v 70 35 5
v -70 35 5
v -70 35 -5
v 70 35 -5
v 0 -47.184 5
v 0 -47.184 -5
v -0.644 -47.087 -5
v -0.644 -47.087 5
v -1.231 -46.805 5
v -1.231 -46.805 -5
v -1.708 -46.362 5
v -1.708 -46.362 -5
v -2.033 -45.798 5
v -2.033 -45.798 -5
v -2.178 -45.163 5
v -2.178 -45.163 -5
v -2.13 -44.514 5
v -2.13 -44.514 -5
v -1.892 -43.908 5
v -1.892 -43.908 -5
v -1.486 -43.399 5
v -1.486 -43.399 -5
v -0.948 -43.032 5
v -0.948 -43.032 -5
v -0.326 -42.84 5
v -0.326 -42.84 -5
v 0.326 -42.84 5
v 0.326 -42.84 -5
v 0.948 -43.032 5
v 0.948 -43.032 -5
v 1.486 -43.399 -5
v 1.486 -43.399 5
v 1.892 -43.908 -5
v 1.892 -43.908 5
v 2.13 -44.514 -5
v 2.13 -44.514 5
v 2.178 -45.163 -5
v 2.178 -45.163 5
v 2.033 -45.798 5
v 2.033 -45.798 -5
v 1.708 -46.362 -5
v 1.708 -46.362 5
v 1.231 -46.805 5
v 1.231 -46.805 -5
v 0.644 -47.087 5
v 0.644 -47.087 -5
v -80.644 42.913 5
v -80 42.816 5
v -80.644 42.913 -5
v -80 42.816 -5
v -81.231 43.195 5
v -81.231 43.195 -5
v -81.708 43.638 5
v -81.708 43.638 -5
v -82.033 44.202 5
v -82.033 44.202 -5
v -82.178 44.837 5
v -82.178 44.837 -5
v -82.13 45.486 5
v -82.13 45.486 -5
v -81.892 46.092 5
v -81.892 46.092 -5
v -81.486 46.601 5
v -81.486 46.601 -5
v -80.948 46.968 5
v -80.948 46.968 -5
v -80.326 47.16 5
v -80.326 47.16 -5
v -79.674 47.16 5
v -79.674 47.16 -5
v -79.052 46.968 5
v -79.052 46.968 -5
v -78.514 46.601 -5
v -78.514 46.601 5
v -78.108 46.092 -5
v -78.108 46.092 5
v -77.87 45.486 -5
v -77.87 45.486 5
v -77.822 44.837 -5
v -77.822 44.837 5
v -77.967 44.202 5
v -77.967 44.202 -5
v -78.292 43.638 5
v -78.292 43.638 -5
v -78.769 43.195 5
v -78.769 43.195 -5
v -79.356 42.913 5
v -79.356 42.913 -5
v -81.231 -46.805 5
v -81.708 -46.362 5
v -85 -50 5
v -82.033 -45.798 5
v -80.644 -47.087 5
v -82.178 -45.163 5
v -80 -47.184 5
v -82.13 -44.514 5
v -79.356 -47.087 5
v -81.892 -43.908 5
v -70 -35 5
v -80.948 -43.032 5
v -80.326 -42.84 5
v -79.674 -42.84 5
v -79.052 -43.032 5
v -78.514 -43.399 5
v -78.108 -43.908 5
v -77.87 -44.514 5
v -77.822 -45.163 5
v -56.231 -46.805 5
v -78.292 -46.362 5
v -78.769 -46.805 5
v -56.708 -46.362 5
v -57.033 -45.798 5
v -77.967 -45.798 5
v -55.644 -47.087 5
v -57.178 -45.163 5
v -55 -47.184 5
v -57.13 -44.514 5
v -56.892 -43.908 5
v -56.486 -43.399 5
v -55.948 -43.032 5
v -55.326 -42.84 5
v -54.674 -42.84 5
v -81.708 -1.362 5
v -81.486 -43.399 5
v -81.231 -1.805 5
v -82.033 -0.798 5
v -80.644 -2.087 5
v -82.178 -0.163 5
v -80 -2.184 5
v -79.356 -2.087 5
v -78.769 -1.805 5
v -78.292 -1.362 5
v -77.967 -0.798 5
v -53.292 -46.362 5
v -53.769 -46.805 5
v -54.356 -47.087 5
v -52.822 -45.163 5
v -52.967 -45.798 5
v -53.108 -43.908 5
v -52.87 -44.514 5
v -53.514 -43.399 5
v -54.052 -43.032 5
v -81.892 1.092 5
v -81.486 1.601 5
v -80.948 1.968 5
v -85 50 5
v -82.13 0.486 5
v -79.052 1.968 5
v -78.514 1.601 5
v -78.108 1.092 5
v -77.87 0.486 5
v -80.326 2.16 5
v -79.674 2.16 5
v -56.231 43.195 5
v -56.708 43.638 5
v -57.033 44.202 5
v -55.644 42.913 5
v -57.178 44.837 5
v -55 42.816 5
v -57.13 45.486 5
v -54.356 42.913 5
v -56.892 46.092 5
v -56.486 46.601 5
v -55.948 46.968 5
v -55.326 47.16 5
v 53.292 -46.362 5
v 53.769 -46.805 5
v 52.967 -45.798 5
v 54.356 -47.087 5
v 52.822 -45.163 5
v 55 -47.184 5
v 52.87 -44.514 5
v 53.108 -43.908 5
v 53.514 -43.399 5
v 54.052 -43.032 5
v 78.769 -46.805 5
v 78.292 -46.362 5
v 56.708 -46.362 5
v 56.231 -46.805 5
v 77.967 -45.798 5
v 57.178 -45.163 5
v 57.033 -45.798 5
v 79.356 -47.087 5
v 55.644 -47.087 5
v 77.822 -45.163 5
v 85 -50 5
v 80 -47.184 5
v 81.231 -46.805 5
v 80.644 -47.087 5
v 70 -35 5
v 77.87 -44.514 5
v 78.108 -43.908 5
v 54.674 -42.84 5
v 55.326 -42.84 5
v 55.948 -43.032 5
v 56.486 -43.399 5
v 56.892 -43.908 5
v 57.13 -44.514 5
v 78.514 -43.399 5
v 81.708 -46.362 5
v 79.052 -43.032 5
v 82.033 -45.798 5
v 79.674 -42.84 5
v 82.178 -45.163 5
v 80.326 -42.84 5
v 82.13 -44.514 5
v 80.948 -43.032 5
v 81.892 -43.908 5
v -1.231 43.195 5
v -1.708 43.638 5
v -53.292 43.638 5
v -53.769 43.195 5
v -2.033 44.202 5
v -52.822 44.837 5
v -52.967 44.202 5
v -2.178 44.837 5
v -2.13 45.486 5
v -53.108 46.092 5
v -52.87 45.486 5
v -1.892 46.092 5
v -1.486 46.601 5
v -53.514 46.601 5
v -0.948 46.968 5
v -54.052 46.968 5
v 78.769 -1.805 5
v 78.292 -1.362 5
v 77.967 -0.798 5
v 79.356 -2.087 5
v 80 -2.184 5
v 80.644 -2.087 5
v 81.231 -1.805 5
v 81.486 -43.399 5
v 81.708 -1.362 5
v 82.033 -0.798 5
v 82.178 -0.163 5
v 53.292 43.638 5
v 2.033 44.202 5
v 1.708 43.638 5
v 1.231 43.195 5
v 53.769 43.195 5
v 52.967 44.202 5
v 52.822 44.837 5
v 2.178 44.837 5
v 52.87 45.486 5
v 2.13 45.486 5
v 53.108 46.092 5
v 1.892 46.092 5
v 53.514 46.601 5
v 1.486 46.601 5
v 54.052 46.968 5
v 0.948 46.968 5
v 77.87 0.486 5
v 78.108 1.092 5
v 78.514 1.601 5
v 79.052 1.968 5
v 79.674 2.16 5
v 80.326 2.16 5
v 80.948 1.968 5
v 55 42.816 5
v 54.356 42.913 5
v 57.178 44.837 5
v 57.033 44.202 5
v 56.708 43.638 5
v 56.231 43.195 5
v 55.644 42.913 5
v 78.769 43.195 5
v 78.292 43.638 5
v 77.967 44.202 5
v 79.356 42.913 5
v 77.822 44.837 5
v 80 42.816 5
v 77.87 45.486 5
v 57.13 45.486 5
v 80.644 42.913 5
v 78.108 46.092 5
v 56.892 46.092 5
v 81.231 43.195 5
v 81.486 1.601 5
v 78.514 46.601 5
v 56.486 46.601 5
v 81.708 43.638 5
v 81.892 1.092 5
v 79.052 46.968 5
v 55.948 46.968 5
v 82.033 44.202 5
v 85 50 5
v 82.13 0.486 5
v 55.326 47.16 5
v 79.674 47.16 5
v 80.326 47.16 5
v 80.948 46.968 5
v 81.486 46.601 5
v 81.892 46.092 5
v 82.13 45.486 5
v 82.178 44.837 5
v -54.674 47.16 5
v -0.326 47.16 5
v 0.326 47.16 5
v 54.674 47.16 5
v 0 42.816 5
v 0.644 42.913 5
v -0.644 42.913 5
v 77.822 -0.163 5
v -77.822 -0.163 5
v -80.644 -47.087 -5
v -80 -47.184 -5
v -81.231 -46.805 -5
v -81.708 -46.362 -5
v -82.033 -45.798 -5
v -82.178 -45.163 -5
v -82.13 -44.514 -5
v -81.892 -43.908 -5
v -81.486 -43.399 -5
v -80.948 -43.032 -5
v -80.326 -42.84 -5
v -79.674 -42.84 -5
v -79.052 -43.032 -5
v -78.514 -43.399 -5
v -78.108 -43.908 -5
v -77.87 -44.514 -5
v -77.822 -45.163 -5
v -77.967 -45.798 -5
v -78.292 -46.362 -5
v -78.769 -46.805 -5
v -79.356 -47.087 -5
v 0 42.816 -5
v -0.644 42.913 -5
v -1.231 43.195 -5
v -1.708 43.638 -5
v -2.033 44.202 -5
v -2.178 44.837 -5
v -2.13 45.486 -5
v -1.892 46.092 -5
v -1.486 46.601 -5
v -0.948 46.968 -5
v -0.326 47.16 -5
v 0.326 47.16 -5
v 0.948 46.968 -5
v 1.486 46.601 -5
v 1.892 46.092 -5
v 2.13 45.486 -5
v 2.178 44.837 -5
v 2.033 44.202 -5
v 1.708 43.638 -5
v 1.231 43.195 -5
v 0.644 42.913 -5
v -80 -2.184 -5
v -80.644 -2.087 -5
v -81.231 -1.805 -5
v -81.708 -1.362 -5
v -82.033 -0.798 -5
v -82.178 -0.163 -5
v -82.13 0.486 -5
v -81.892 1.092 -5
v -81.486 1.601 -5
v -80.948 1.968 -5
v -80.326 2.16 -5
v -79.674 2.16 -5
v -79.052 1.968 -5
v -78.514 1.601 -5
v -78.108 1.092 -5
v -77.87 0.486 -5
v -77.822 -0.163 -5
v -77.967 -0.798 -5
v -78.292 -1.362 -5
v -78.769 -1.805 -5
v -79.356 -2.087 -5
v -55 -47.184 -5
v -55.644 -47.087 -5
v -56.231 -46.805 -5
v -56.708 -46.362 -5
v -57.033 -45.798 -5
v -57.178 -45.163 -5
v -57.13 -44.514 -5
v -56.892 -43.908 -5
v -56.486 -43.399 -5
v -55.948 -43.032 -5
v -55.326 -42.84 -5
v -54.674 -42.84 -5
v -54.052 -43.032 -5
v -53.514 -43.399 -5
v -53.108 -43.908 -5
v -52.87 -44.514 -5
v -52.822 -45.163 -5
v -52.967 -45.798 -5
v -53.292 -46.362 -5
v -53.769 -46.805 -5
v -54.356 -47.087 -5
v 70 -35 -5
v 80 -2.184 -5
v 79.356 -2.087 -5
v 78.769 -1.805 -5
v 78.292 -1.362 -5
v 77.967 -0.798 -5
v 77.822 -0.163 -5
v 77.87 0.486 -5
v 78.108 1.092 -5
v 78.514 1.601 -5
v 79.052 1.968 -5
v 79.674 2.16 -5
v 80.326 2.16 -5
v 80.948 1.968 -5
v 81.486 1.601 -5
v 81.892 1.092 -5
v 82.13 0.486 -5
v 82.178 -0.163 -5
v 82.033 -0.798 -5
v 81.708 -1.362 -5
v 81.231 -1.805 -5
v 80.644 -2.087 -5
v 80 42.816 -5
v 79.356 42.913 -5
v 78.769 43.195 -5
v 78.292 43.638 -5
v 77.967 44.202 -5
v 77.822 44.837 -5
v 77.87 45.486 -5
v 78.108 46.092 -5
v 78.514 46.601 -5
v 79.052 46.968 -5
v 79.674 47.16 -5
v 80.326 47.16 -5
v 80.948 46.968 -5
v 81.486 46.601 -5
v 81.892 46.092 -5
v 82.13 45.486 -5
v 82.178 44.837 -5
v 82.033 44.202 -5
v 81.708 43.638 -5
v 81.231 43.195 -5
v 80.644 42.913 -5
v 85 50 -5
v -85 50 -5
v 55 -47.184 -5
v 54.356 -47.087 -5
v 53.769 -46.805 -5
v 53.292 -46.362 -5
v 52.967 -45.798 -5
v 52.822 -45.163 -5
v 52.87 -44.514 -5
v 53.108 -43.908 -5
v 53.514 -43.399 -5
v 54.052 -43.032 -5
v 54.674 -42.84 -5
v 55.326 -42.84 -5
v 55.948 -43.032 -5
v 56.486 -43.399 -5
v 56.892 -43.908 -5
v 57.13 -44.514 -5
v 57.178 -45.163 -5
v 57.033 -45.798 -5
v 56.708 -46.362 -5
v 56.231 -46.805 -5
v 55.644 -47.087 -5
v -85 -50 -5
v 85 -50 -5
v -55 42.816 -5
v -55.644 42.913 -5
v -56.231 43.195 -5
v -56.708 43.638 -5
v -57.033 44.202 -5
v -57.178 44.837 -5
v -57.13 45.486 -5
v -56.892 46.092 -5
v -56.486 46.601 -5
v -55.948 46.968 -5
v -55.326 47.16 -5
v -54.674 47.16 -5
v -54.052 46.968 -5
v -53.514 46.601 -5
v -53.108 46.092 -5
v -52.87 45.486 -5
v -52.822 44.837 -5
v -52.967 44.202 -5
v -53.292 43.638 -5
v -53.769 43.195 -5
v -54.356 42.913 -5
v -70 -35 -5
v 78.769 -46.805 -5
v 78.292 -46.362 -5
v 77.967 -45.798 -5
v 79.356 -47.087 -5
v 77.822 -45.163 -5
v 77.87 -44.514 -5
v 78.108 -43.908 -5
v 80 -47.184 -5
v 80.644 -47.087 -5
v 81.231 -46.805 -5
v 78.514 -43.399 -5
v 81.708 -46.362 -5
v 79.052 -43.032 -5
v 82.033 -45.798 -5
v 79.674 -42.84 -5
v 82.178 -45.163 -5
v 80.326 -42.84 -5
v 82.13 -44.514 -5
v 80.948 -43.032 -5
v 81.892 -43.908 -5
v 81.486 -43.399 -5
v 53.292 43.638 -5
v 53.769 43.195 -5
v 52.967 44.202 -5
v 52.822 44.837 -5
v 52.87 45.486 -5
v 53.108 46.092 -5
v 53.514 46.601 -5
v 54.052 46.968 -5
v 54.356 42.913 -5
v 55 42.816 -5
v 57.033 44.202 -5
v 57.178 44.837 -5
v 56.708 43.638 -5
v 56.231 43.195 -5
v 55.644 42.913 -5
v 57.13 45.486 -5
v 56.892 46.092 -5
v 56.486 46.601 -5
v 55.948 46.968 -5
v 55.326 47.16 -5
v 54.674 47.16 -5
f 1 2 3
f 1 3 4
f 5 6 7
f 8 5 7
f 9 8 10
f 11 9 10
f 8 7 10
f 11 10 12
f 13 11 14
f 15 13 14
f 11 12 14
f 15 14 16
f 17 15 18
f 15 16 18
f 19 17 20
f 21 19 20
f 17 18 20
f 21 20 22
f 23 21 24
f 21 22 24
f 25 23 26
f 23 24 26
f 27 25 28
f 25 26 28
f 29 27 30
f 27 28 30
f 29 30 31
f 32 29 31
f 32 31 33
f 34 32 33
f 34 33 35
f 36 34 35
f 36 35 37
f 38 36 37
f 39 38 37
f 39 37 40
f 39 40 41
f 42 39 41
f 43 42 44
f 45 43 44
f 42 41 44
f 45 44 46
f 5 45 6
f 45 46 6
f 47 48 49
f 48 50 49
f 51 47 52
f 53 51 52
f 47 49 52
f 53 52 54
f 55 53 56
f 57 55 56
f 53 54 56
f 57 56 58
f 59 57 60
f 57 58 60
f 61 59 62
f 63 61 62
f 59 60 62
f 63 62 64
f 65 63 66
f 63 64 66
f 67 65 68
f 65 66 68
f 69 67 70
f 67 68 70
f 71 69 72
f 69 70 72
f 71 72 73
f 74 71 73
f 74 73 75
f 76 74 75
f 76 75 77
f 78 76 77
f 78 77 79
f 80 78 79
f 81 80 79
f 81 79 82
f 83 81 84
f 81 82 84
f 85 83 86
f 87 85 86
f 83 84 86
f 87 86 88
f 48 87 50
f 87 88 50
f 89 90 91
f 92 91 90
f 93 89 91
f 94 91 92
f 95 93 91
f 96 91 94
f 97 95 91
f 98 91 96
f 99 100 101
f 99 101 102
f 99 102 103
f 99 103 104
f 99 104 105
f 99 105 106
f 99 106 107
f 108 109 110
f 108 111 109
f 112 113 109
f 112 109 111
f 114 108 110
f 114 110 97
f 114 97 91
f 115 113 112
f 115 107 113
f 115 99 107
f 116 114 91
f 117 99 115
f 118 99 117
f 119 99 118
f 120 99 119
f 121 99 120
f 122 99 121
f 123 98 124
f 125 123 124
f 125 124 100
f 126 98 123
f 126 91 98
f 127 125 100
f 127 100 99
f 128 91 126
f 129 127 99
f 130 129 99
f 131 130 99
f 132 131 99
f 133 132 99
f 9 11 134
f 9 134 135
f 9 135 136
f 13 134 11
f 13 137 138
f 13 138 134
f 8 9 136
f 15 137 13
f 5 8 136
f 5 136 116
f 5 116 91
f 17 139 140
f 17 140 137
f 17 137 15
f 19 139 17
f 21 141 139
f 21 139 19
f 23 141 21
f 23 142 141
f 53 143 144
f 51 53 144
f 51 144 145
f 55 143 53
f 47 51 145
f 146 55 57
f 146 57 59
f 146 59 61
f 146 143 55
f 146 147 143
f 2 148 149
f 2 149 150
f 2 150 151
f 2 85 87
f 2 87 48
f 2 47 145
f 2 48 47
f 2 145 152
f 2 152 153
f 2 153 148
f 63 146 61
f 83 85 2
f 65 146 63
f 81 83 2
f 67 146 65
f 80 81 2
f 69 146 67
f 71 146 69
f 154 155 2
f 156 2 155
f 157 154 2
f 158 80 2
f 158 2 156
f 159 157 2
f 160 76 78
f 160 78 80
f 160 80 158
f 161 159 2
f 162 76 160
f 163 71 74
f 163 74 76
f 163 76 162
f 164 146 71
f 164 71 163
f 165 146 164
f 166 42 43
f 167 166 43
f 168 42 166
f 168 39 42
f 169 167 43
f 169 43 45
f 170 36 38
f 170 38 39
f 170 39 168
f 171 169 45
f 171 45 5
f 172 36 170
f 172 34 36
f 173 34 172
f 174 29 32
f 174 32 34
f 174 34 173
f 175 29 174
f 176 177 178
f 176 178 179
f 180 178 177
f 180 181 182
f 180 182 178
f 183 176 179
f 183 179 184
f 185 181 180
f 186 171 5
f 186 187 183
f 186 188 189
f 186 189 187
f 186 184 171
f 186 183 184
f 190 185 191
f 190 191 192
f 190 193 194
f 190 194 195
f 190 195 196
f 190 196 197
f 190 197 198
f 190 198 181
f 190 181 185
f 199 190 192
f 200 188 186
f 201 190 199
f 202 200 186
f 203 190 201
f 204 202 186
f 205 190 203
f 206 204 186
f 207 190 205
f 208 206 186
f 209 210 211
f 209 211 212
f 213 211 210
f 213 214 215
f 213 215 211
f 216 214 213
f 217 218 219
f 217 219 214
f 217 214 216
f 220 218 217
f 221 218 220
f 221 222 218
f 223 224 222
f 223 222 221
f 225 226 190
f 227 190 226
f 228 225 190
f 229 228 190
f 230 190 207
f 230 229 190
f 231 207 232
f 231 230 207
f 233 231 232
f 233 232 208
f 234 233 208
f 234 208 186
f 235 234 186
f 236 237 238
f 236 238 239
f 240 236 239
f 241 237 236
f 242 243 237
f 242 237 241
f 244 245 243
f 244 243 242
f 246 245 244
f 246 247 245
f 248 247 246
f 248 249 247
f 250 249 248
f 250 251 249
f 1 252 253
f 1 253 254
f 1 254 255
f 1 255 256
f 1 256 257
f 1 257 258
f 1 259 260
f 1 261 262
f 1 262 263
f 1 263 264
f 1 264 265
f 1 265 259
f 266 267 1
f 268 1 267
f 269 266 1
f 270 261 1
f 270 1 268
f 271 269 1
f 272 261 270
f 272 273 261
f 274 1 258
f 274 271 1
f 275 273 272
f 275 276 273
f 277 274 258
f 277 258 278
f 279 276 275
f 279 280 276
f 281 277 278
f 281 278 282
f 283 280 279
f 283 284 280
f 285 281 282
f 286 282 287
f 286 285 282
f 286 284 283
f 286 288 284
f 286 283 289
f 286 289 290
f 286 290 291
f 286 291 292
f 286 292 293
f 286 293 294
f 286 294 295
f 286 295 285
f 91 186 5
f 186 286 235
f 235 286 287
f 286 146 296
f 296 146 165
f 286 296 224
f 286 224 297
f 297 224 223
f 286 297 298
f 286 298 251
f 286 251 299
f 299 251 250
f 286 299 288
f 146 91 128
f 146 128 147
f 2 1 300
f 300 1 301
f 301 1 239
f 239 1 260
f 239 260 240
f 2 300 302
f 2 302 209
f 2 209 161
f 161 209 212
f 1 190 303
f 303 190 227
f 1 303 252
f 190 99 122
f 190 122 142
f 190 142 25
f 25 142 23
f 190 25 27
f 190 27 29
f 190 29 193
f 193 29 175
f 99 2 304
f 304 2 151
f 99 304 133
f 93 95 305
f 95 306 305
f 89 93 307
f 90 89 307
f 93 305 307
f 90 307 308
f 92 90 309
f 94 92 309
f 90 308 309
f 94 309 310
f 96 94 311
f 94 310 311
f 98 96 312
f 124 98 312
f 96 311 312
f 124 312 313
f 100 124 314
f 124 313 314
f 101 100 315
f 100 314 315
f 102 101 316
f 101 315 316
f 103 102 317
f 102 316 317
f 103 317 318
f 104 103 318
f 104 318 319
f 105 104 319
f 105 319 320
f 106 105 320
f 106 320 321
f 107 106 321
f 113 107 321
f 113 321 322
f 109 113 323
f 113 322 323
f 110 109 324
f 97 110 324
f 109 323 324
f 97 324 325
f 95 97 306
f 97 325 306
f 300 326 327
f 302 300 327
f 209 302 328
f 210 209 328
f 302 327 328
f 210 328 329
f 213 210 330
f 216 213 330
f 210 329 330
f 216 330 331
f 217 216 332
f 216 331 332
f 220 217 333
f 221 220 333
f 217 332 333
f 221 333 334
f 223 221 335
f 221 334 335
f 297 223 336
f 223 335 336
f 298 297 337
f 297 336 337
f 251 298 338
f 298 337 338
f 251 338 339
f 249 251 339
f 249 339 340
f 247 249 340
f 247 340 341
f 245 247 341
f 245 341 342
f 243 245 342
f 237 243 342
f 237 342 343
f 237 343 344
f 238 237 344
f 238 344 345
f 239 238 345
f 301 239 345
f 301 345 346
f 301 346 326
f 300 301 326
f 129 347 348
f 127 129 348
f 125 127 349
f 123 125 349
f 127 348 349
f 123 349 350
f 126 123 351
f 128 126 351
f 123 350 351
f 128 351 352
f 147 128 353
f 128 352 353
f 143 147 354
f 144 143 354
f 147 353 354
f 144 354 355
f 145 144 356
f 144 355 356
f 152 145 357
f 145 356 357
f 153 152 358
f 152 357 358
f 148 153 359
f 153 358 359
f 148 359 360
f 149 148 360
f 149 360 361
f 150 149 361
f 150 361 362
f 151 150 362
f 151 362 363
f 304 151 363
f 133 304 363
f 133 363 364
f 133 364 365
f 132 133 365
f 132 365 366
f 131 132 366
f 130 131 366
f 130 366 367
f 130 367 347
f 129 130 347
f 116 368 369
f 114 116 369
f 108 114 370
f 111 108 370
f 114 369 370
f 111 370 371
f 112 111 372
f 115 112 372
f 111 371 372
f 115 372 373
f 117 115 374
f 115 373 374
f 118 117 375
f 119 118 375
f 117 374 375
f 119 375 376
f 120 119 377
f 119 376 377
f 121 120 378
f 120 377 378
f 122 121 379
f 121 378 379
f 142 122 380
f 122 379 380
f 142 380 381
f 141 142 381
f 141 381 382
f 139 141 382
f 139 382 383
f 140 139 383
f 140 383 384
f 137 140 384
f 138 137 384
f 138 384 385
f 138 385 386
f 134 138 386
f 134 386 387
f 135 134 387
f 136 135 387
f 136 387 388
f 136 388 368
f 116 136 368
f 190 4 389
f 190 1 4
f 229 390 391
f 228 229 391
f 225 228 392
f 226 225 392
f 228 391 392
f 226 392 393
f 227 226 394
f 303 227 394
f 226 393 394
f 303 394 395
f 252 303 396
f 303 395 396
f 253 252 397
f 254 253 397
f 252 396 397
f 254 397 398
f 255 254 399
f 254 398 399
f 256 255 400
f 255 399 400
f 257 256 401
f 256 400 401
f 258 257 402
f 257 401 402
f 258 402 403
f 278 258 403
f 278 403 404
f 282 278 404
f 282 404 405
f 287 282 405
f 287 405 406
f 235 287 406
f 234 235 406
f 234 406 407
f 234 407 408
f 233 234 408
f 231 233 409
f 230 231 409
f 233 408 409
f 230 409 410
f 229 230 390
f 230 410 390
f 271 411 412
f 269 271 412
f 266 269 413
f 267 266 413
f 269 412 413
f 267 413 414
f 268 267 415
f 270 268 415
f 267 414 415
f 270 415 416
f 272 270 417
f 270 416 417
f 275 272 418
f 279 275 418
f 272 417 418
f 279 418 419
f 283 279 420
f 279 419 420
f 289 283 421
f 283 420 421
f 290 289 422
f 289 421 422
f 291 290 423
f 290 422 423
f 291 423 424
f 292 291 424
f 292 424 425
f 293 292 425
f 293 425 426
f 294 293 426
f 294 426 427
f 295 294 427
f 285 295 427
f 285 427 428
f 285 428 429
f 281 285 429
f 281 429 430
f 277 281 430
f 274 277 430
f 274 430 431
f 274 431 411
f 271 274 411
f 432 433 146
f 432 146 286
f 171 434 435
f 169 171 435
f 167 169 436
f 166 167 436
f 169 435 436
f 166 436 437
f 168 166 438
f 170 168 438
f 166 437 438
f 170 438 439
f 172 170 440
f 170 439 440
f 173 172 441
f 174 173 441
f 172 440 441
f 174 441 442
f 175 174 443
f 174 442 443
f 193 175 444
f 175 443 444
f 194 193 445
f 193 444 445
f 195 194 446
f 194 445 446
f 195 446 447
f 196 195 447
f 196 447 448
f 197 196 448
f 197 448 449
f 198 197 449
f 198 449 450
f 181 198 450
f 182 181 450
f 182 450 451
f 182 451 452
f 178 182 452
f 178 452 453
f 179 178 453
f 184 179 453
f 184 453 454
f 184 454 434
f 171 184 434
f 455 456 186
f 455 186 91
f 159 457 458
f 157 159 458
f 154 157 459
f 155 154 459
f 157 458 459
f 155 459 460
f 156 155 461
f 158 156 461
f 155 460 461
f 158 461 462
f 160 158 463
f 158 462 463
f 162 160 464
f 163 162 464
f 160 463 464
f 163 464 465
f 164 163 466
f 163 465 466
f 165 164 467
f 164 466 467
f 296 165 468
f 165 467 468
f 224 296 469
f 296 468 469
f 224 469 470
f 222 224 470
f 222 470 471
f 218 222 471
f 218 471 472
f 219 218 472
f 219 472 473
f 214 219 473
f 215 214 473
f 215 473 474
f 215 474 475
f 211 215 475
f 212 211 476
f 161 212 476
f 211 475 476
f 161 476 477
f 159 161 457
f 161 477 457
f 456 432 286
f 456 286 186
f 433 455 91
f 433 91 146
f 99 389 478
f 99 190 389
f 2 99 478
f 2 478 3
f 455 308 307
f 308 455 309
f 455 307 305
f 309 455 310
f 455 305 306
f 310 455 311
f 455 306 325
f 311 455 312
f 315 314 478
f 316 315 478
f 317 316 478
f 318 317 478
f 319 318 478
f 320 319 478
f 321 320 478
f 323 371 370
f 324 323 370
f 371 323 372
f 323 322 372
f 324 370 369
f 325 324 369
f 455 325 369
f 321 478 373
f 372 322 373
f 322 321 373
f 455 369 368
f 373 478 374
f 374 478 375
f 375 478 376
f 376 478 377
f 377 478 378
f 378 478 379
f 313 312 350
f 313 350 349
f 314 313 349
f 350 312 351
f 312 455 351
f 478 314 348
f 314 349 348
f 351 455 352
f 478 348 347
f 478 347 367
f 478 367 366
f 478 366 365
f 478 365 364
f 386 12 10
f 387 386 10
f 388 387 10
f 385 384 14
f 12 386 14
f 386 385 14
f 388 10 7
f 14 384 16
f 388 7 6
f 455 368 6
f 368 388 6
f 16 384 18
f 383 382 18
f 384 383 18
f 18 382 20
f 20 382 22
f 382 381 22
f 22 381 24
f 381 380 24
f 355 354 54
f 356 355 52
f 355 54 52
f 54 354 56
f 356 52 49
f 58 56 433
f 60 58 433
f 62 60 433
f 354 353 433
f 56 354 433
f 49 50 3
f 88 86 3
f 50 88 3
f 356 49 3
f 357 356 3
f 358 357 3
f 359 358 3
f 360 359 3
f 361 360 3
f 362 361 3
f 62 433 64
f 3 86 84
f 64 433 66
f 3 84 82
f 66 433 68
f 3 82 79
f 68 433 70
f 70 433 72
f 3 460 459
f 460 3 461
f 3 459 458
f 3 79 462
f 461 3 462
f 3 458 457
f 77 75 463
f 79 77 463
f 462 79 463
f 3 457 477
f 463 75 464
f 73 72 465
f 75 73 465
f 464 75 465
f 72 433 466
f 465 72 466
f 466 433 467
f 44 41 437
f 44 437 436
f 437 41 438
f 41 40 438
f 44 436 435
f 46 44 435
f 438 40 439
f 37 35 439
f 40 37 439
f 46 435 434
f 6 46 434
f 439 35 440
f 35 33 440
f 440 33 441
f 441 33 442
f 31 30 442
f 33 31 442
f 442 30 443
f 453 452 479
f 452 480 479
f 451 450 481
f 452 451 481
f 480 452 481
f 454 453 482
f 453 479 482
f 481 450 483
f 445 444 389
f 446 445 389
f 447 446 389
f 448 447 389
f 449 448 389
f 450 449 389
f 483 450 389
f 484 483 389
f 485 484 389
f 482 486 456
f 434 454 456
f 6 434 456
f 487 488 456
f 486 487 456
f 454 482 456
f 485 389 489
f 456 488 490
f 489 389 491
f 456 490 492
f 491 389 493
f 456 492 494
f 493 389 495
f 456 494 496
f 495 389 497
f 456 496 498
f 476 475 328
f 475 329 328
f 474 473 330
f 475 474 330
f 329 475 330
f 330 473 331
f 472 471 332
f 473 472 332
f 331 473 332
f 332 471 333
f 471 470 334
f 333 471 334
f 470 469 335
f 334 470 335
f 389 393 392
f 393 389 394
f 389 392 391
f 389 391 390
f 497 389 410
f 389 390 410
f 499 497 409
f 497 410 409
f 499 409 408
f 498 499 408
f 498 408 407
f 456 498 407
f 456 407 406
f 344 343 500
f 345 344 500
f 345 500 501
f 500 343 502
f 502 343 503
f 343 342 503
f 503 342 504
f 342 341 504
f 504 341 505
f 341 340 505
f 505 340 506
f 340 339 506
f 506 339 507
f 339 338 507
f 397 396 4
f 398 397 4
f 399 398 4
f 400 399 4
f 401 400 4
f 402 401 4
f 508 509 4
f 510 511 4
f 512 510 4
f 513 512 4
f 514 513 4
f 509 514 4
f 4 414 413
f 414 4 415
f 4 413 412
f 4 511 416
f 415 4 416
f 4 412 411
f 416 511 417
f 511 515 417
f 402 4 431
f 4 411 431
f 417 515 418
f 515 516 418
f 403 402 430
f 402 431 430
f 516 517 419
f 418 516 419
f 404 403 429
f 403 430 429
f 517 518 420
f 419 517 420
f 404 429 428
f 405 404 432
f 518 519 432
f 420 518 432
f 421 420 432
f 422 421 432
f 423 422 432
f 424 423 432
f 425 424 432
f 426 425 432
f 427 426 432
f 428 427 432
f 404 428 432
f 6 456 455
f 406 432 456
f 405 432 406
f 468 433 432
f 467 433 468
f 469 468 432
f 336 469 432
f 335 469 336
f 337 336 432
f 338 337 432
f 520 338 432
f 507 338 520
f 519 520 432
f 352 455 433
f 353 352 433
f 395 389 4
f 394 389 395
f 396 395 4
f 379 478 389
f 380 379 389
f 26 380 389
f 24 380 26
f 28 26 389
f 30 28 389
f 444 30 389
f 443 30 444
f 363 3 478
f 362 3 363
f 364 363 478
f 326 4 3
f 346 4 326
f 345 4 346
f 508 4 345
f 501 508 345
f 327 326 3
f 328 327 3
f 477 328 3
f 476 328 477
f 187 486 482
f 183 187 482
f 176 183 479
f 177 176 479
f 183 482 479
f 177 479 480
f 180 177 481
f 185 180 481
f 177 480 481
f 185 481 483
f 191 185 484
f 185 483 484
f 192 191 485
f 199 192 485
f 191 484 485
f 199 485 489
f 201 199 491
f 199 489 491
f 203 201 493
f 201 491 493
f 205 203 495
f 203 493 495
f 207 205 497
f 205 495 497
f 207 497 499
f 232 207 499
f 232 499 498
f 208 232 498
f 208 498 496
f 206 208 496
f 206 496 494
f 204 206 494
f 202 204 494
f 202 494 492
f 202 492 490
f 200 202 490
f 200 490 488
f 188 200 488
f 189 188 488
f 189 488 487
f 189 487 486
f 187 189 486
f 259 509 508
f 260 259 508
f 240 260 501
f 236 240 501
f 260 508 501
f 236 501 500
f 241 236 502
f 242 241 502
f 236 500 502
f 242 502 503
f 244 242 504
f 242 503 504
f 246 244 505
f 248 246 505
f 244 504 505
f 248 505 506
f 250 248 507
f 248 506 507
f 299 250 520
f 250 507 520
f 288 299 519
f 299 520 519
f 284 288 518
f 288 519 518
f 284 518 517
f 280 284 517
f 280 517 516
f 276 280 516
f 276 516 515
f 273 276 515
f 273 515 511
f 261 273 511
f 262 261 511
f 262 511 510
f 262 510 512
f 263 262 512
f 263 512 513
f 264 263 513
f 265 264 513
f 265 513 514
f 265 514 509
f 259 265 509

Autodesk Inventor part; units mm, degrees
ref_plane "YZ Plane" through (0, 0, 0) normal (1, 0, 0) x (0, 1, 0)
ref_plane "XZ Plane" through (0, 0, 0) normal (0, 1, 0) x (-1, 0, 0)
ref_plane "XY Plane" through (0, 0, 0) normal (0, 0, 1) x (1, 0, 0)
sketch "Sketch1" plane through (0, 0, 0) normal (0, 0, 1) x (1, 0, 0)
  line L0 (-85, 50) -> (85, 50)
  line L1 (85, 50) -> (85, -50)
  line L2 (85, -50) -> (-85, -50)
  line L3 (-85, -50) -> (-85, 50)
  line L4 (-85, 50) -> (85, -50) construction
  line L5 (85, 50) -> (-85, -50) construction
  point P0 (0, 0)
  dimension "d0" = 170
  dimension "d1" = 100
extrude "Extrusion1" add sketch "Sketch1" along normal mid plane 10
sketch "Sketch2" plane through (0, 0, 5) normal (0, 0, 1) x (1, 0, 0)
  line L0 (-70, 35) -> (70, 35)
  line L1 (70, 35) -> (70, -35)
  line L2 (70, -35) -> (-70, -35)
  line L3 (-70, -35) -> (-70, 35)
  line L4 (-70, 35) -> (70, -35) construction
  line L5 (70, 35) -> (-70, -35) construction
  point P0 (0, 0)
  dimension "d4" = 140
  dimension "d5" = 70
extrude "Extrusion2" cut sketch "Sketch2" against normal blind 10
sketch "Sketch4" plane through (0, 0, 5) normal (0, 0, 1) x (1, 0, 0)
  line L0 (-85, 50) -> (-85, -50) projected
  line L1 (85, 50) -> (-85, 50) projected
  line L2 (-85, -50) -> (85, -50) projected
  line L3 (85, -50) -> (85, 50) projected
  point P0 (0, 0)
  point P1 (-80, 0)
  point P2 (-80, -45)
  point P3 (0, -45)
  point P4 (-55, -45)
  point P5 (55, -45)
  point P6 (80, -45)
  point P7 (80, 0)
  point P8 (-80, 45)
  point P9 (-55, 45)
  point P10 (55, 45)
  point P11 (0, 45)
  point P12 (80, 45)
  dimension "d72" = 50
  dimension "d73" = 5
  dimension "d74" = 5
  dimension "d75" = 85
  dimension "d78" = 25
  dimension "d80" = 5
  dimension "d81" = 5
  dimension "d82" = 25
  dimension "d85" = 160
  dimension "d115" = 5
  dimension "d116" = 5
  dimension "d117" = 5
  dimension "d120" = 90
  dimension "d125" = 45
hole "Hole2" at (-80, 0, 5) at (-80, -45, 5) at (0, -45, 5) at (-55, -45, 5) at (55, -45, 5) at (80, -45, 5) at (80, 0, 5) at (80, 45, 5) at (55, 45, 5) at (0, 45, 5) at (-55, 45, 5) at (-80, 45, 5) direction (0, 0, -1) diameter 4.3688 end through all
properties part number "gasket"
